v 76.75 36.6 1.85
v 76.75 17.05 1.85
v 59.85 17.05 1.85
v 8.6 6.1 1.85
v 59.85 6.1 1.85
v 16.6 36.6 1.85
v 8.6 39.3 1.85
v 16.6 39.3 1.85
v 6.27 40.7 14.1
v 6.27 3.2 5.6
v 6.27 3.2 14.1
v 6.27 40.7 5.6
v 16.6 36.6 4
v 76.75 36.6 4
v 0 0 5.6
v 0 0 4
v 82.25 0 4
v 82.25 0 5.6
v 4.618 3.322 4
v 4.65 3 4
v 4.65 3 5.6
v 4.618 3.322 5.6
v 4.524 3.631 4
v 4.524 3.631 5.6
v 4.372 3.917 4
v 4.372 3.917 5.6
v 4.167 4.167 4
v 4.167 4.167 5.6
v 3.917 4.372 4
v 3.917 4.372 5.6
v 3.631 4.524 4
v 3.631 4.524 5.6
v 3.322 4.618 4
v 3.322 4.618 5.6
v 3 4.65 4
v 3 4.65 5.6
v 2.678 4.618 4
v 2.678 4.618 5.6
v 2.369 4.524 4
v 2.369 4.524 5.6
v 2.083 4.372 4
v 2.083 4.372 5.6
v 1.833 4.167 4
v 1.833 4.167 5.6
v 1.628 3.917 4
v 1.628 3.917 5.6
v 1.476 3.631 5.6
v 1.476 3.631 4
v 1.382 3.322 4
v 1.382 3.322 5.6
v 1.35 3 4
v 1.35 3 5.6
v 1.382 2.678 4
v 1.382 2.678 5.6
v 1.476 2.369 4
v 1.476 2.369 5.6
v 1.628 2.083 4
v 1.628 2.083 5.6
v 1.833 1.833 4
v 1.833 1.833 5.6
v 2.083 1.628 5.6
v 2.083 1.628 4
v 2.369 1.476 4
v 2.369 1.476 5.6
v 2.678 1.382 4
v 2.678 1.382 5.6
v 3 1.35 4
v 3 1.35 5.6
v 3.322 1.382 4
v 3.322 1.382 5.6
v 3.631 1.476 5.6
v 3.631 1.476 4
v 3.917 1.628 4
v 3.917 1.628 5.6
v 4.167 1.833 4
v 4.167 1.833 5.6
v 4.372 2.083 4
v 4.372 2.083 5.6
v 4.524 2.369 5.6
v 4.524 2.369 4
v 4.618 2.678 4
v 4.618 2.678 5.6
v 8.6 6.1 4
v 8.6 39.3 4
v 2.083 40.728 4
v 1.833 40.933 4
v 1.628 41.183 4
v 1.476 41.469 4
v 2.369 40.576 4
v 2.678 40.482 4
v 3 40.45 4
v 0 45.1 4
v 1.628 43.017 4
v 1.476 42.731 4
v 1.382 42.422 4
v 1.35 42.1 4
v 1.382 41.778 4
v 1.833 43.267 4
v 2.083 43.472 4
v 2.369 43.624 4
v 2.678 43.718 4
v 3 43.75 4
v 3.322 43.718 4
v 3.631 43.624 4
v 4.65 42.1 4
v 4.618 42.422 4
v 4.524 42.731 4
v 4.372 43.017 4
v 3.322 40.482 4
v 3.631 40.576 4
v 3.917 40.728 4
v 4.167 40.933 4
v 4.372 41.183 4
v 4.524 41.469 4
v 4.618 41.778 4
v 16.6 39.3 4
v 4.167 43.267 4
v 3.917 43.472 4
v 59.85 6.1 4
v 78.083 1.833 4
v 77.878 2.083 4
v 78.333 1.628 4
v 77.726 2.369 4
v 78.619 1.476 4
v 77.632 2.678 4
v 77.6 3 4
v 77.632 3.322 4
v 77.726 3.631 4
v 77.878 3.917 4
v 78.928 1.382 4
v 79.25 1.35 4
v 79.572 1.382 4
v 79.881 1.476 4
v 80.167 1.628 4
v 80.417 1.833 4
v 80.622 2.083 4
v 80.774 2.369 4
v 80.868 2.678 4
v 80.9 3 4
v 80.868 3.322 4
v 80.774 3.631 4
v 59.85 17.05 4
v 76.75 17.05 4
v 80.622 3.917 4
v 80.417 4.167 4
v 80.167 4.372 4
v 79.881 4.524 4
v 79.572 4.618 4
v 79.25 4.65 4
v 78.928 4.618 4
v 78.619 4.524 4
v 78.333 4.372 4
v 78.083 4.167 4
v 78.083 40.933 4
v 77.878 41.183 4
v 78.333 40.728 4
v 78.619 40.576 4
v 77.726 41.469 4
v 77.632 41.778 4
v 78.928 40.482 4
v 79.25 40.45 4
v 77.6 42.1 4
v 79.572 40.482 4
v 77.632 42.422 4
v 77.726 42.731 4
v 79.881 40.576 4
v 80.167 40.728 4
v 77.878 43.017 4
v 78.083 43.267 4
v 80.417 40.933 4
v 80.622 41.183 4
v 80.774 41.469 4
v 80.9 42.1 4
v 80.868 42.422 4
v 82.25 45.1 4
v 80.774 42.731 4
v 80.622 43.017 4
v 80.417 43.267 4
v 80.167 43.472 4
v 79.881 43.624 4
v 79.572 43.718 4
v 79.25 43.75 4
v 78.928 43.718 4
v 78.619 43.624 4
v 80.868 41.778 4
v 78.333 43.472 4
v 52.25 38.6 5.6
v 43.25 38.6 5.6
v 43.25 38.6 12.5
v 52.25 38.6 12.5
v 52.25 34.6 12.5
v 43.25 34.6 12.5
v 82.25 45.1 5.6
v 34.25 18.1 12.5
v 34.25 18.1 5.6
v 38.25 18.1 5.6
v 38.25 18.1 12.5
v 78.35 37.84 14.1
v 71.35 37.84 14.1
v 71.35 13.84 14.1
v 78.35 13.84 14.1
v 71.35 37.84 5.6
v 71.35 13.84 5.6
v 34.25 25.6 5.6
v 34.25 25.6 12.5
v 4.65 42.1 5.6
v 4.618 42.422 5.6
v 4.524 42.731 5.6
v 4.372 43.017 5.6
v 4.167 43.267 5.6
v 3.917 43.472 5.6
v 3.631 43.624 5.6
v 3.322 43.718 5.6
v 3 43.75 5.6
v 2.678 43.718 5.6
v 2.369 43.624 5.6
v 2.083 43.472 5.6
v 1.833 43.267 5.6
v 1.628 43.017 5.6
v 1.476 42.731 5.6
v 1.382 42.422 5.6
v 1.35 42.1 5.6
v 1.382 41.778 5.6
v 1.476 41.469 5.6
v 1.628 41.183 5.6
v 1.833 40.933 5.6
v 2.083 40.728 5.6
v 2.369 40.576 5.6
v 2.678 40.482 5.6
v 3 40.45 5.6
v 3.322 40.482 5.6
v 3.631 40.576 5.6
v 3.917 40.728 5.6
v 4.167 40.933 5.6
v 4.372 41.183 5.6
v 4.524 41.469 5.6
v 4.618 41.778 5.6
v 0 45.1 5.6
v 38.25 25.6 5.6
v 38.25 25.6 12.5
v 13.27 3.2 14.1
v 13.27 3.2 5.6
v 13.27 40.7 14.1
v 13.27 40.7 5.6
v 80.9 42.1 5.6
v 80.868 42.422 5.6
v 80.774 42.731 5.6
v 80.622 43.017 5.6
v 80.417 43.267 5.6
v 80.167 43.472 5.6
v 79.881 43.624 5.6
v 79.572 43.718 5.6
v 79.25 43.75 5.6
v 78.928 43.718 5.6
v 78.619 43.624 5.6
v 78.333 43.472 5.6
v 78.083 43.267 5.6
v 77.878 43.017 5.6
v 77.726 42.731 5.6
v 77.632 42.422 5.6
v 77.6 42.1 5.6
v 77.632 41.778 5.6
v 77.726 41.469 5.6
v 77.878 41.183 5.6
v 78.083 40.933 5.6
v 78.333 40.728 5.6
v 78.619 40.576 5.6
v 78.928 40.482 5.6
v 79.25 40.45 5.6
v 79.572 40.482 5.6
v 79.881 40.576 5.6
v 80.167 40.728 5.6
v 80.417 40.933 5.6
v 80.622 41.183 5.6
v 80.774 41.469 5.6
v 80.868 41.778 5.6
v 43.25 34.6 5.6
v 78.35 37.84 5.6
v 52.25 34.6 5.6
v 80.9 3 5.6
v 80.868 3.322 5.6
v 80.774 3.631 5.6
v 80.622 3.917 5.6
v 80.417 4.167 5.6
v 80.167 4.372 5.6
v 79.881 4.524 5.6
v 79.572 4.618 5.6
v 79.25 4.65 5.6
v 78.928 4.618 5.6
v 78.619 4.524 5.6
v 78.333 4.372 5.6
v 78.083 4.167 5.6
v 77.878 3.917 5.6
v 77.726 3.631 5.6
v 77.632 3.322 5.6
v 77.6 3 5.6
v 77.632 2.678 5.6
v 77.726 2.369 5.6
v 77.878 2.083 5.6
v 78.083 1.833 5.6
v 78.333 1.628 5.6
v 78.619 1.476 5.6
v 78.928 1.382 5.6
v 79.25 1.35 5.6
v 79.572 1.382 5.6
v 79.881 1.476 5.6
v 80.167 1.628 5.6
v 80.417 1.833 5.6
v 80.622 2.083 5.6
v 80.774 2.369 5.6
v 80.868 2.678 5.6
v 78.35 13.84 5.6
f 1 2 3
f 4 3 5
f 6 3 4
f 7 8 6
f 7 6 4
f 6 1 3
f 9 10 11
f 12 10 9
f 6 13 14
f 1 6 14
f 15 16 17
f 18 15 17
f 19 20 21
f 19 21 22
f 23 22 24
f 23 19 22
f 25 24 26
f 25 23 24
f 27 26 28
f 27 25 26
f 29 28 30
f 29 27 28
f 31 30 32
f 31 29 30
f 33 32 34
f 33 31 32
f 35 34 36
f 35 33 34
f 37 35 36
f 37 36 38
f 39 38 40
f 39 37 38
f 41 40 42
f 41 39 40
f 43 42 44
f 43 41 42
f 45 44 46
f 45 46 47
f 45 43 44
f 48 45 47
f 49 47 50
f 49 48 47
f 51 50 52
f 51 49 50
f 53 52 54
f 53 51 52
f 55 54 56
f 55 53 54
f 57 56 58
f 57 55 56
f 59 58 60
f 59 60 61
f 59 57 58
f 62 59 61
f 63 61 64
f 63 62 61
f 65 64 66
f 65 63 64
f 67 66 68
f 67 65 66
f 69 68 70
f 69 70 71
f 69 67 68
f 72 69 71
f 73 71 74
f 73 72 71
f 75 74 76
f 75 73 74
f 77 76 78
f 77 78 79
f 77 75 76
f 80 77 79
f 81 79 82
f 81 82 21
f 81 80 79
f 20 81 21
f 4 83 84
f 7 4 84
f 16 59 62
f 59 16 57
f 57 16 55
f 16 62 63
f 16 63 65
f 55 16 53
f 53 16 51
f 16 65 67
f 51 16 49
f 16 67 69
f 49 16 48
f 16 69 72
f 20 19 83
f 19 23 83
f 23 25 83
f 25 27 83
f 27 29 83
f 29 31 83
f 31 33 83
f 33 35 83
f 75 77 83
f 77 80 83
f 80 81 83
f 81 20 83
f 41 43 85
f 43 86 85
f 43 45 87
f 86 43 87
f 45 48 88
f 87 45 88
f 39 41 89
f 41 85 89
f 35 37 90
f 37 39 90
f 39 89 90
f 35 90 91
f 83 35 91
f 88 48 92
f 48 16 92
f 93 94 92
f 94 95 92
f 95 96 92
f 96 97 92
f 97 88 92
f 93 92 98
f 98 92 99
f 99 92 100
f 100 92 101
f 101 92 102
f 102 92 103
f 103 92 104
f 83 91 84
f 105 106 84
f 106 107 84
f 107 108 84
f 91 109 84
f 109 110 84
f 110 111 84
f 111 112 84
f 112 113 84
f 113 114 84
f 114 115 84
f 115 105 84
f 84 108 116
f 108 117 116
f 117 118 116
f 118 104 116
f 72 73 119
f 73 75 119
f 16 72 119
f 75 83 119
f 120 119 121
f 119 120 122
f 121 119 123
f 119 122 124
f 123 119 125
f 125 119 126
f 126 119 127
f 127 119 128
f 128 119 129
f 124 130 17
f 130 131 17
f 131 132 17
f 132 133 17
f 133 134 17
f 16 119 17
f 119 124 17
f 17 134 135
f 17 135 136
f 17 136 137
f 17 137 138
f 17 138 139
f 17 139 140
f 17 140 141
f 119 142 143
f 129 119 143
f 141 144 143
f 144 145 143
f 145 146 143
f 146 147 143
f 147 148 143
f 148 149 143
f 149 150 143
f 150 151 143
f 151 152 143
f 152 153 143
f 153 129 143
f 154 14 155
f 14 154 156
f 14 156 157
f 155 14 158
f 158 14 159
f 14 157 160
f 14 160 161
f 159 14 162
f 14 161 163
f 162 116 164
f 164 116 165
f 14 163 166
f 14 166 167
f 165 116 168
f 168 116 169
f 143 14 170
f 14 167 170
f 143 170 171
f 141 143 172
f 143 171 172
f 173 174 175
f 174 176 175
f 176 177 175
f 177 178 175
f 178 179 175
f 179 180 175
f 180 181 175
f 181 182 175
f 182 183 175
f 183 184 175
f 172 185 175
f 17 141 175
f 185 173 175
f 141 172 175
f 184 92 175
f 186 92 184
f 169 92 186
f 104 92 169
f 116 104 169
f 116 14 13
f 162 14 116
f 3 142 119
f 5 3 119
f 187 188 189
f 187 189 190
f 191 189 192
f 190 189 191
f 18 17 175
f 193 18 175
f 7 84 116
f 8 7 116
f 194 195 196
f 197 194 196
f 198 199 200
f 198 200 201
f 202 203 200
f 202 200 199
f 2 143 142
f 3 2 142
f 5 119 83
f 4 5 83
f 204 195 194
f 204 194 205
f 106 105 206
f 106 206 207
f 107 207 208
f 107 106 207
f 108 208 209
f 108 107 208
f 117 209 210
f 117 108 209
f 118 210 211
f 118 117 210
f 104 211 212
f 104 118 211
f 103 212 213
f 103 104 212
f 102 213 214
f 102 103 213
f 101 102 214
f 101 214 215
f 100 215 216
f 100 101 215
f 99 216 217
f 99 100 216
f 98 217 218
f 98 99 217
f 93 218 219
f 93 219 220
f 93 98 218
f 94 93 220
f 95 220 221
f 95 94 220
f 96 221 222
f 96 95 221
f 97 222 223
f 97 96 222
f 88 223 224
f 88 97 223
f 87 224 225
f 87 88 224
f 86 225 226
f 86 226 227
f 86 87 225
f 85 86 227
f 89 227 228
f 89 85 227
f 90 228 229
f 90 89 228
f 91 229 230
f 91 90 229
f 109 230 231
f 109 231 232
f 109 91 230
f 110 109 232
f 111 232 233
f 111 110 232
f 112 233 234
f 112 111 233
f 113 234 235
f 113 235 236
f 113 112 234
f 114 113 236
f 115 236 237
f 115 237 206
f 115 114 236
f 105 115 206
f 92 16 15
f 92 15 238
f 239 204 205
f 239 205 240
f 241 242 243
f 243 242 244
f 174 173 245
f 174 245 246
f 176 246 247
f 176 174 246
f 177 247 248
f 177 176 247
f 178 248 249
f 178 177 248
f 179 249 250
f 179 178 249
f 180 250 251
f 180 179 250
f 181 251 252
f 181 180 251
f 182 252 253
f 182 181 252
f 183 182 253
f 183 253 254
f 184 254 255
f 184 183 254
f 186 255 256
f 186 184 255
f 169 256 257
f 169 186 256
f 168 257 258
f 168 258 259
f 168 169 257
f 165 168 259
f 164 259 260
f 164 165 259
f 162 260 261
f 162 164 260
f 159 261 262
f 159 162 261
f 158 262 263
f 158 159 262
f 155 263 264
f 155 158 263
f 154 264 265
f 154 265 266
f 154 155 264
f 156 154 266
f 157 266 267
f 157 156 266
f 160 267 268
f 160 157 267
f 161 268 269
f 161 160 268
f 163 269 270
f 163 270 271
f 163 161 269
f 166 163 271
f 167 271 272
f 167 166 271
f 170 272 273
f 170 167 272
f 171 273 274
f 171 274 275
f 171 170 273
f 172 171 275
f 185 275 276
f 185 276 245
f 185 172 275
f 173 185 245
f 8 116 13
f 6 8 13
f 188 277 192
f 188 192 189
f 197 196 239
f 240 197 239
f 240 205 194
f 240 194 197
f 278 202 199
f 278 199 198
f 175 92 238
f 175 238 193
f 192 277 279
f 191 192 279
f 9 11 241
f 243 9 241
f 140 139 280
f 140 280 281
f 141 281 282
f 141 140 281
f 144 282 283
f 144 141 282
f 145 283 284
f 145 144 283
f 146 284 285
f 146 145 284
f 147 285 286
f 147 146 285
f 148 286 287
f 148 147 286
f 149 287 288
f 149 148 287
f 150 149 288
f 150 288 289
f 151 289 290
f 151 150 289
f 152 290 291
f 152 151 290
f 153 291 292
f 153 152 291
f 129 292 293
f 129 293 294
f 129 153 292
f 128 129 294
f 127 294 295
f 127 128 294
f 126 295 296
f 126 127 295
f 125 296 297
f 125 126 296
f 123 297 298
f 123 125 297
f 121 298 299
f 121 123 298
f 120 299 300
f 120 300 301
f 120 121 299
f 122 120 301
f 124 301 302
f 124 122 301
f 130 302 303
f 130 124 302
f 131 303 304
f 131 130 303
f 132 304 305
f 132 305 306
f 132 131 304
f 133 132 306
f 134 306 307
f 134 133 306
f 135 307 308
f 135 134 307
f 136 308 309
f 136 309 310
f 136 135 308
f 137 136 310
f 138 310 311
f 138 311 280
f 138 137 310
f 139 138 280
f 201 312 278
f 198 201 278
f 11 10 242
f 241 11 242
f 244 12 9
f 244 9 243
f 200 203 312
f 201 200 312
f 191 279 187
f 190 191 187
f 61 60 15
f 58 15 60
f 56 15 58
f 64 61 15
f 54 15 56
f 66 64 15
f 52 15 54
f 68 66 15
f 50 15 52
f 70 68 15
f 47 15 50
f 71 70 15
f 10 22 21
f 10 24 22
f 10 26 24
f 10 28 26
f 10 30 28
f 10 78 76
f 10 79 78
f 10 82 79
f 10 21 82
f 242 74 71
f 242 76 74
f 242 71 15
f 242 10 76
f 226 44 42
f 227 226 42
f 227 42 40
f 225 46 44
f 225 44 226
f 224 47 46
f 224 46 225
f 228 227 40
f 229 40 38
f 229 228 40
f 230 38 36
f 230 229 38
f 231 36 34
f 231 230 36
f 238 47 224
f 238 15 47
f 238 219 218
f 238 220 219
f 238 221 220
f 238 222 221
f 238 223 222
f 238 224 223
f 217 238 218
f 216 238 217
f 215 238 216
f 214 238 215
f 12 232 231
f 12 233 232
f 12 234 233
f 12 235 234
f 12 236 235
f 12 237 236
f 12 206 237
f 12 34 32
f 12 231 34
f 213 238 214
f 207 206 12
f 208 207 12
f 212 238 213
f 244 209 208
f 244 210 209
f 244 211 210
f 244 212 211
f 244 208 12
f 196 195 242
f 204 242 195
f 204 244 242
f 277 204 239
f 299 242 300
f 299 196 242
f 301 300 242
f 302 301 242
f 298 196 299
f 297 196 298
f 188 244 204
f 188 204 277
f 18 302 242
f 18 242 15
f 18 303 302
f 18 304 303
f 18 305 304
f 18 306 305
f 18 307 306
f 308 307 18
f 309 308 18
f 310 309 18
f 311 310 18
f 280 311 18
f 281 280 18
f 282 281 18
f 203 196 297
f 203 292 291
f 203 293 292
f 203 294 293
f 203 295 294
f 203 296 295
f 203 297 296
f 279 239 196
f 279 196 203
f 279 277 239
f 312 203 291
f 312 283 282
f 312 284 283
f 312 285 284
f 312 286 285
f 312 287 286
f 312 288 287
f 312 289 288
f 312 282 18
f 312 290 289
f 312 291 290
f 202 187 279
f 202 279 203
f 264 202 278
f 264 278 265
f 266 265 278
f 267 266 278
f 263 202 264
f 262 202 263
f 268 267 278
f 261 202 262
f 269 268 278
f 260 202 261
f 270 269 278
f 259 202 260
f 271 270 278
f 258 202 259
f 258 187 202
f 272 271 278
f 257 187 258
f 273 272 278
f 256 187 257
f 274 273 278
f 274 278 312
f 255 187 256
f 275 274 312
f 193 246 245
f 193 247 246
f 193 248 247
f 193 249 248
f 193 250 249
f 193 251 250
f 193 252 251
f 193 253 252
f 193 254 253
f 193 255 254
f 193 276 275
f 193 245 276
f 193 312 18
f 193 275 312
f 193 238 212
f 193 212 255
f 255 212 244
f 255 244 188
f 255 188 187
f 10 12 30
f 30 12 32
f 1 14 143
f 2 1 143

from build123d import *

# Parameters (mm, degrees)
EXTRUDE002_DEPTH = 2.15
SKETCH002_W      = 82.25
SKETCH002_H      = 45.1
SKETCH002_R      = 1.65
EXTRUDE003_DEPTH = 1.6
SKETCH004_W      = 7
SKETCH004_H      = 24
EXTRUDE004_DEPTH = 8.5
SKETCH048_W      = 9
SKETCH048_H      = 4
SKETCH048_W_2    = 4
SKETCH048_H_2    = 7.5
EXTRUDE049_DEPTH = 8.5
SKETCH005_W      = 7
SKETCH005_H      = 37.5
EXTRUDE005_DEPTH = 8.5


with BuildPart() as extrude_contolleboard_bottom:
    # Sketch003 → Extrude002 (new body)
    with BuildSketch(Plane.XY):
        Polygon((76.75, 36.6), (76.75, 17.05), (59.85, 17.05), (59.85, 6.1), (8.6, 6.1), (8.6, 39.3), (16.6, 39.3), (16.6, 36.6), align=None)
    extrude(amount=-EXTRUDE002_DEPTH)


with BuildPart() as extrude_contolleboard_base:
    # Sketch002 → Extrude003 (new body)
    with BuildSketch(Plane.XY):
        with Locations((41.125, 22.55)):
            Rectangle(SKETCH002_W, SKETCH002_H)
        with Locations((3, 42.1)):
            Circle(SKETCH002_R, mode=Mode.SUBTRACT)
        with Locations((79.25, 42.1)):
            Circle(SKETCH002_R, mode=Mode.SUBTRACT)
        with Locations((3, 3)):
            Circle(SKETCH002_R, mode=Mode.SUBTRACT)
        with Locations((79.25, 3)):
            Circle(SKETCH002_R, mode=Mode.SUBTRACT)
    extrude(amount=EXTRUDE003_DEPTH)


with BuildPart() as extrude_contolleboard_parts_left:
    # Sketch004 → Extrude004 (new body)
    with BuildSketch(Plane.XY):
        with Locations((74.85, 25.84)):
            Rectangle(SKETCH004_W, SKETCH004_H)
    extrude(amount=EXTRUDE004_DEPTH)


with BuildPart() as extrude_contolleboard_parts_left_1:
    # Extrude004 placement: moved
    add(extrude_contolleboard_parts_left.part.moved(Location((0, 0, 1.6))))


with BuildPart() as extrude_contolleboard_headers:
    # Sketch048 → Extrude049 (new body)
    with BuildSketch(Plane.XY):
        with Locations((47.75, 36.6)):
            Rectangle(SKETCH048_W, SKETCH048_H)
        with Locations((36.25, 21.85)):
            Rectangle(SKETCH048_W_2, SKETCH048_H_2)
    extrude(amount=EXTRUDE049_DEPTH)


with BuildPart() as fusion_contolleboard:
    # Sketch005 → Extrude005 (new body)
    with BuildSketch(Plane.XY):
        with Locations((9.77, 21.95)):
            Rectangle(SKETCH005_W, SKETCH005_H)
    extrude(amount=EXTRUDE005_DEPTH)


with BuildPart() as fusion_contolleboard_1:
    # Extrude005 placement: moved
    add(fusion_contolleboard.part.moved(Location((0, 0, 1.6))))

    # Fusion001: union Extrude_ContolleBoard_bottom, Extrude_ContolleBoard_base, Extrude_ContolleBoard_parts_left, Extrude_ContolleBoard_headers
    add(extrude_contolleboard_bottom.part)
    add(extrude_contolleboard_base.part)
    add(extrude_contolleboard_parts_left_1.part)
    add(extrude_contolleboard_headers.part)


with BuildPart() as fusion_contolleboard_2:
    # Fusion001 placement: moved
    add(fusion_contolleboard_1.part.moved(Location((0, 0, 4))))


solid = fusion_contolleboard_2.part
